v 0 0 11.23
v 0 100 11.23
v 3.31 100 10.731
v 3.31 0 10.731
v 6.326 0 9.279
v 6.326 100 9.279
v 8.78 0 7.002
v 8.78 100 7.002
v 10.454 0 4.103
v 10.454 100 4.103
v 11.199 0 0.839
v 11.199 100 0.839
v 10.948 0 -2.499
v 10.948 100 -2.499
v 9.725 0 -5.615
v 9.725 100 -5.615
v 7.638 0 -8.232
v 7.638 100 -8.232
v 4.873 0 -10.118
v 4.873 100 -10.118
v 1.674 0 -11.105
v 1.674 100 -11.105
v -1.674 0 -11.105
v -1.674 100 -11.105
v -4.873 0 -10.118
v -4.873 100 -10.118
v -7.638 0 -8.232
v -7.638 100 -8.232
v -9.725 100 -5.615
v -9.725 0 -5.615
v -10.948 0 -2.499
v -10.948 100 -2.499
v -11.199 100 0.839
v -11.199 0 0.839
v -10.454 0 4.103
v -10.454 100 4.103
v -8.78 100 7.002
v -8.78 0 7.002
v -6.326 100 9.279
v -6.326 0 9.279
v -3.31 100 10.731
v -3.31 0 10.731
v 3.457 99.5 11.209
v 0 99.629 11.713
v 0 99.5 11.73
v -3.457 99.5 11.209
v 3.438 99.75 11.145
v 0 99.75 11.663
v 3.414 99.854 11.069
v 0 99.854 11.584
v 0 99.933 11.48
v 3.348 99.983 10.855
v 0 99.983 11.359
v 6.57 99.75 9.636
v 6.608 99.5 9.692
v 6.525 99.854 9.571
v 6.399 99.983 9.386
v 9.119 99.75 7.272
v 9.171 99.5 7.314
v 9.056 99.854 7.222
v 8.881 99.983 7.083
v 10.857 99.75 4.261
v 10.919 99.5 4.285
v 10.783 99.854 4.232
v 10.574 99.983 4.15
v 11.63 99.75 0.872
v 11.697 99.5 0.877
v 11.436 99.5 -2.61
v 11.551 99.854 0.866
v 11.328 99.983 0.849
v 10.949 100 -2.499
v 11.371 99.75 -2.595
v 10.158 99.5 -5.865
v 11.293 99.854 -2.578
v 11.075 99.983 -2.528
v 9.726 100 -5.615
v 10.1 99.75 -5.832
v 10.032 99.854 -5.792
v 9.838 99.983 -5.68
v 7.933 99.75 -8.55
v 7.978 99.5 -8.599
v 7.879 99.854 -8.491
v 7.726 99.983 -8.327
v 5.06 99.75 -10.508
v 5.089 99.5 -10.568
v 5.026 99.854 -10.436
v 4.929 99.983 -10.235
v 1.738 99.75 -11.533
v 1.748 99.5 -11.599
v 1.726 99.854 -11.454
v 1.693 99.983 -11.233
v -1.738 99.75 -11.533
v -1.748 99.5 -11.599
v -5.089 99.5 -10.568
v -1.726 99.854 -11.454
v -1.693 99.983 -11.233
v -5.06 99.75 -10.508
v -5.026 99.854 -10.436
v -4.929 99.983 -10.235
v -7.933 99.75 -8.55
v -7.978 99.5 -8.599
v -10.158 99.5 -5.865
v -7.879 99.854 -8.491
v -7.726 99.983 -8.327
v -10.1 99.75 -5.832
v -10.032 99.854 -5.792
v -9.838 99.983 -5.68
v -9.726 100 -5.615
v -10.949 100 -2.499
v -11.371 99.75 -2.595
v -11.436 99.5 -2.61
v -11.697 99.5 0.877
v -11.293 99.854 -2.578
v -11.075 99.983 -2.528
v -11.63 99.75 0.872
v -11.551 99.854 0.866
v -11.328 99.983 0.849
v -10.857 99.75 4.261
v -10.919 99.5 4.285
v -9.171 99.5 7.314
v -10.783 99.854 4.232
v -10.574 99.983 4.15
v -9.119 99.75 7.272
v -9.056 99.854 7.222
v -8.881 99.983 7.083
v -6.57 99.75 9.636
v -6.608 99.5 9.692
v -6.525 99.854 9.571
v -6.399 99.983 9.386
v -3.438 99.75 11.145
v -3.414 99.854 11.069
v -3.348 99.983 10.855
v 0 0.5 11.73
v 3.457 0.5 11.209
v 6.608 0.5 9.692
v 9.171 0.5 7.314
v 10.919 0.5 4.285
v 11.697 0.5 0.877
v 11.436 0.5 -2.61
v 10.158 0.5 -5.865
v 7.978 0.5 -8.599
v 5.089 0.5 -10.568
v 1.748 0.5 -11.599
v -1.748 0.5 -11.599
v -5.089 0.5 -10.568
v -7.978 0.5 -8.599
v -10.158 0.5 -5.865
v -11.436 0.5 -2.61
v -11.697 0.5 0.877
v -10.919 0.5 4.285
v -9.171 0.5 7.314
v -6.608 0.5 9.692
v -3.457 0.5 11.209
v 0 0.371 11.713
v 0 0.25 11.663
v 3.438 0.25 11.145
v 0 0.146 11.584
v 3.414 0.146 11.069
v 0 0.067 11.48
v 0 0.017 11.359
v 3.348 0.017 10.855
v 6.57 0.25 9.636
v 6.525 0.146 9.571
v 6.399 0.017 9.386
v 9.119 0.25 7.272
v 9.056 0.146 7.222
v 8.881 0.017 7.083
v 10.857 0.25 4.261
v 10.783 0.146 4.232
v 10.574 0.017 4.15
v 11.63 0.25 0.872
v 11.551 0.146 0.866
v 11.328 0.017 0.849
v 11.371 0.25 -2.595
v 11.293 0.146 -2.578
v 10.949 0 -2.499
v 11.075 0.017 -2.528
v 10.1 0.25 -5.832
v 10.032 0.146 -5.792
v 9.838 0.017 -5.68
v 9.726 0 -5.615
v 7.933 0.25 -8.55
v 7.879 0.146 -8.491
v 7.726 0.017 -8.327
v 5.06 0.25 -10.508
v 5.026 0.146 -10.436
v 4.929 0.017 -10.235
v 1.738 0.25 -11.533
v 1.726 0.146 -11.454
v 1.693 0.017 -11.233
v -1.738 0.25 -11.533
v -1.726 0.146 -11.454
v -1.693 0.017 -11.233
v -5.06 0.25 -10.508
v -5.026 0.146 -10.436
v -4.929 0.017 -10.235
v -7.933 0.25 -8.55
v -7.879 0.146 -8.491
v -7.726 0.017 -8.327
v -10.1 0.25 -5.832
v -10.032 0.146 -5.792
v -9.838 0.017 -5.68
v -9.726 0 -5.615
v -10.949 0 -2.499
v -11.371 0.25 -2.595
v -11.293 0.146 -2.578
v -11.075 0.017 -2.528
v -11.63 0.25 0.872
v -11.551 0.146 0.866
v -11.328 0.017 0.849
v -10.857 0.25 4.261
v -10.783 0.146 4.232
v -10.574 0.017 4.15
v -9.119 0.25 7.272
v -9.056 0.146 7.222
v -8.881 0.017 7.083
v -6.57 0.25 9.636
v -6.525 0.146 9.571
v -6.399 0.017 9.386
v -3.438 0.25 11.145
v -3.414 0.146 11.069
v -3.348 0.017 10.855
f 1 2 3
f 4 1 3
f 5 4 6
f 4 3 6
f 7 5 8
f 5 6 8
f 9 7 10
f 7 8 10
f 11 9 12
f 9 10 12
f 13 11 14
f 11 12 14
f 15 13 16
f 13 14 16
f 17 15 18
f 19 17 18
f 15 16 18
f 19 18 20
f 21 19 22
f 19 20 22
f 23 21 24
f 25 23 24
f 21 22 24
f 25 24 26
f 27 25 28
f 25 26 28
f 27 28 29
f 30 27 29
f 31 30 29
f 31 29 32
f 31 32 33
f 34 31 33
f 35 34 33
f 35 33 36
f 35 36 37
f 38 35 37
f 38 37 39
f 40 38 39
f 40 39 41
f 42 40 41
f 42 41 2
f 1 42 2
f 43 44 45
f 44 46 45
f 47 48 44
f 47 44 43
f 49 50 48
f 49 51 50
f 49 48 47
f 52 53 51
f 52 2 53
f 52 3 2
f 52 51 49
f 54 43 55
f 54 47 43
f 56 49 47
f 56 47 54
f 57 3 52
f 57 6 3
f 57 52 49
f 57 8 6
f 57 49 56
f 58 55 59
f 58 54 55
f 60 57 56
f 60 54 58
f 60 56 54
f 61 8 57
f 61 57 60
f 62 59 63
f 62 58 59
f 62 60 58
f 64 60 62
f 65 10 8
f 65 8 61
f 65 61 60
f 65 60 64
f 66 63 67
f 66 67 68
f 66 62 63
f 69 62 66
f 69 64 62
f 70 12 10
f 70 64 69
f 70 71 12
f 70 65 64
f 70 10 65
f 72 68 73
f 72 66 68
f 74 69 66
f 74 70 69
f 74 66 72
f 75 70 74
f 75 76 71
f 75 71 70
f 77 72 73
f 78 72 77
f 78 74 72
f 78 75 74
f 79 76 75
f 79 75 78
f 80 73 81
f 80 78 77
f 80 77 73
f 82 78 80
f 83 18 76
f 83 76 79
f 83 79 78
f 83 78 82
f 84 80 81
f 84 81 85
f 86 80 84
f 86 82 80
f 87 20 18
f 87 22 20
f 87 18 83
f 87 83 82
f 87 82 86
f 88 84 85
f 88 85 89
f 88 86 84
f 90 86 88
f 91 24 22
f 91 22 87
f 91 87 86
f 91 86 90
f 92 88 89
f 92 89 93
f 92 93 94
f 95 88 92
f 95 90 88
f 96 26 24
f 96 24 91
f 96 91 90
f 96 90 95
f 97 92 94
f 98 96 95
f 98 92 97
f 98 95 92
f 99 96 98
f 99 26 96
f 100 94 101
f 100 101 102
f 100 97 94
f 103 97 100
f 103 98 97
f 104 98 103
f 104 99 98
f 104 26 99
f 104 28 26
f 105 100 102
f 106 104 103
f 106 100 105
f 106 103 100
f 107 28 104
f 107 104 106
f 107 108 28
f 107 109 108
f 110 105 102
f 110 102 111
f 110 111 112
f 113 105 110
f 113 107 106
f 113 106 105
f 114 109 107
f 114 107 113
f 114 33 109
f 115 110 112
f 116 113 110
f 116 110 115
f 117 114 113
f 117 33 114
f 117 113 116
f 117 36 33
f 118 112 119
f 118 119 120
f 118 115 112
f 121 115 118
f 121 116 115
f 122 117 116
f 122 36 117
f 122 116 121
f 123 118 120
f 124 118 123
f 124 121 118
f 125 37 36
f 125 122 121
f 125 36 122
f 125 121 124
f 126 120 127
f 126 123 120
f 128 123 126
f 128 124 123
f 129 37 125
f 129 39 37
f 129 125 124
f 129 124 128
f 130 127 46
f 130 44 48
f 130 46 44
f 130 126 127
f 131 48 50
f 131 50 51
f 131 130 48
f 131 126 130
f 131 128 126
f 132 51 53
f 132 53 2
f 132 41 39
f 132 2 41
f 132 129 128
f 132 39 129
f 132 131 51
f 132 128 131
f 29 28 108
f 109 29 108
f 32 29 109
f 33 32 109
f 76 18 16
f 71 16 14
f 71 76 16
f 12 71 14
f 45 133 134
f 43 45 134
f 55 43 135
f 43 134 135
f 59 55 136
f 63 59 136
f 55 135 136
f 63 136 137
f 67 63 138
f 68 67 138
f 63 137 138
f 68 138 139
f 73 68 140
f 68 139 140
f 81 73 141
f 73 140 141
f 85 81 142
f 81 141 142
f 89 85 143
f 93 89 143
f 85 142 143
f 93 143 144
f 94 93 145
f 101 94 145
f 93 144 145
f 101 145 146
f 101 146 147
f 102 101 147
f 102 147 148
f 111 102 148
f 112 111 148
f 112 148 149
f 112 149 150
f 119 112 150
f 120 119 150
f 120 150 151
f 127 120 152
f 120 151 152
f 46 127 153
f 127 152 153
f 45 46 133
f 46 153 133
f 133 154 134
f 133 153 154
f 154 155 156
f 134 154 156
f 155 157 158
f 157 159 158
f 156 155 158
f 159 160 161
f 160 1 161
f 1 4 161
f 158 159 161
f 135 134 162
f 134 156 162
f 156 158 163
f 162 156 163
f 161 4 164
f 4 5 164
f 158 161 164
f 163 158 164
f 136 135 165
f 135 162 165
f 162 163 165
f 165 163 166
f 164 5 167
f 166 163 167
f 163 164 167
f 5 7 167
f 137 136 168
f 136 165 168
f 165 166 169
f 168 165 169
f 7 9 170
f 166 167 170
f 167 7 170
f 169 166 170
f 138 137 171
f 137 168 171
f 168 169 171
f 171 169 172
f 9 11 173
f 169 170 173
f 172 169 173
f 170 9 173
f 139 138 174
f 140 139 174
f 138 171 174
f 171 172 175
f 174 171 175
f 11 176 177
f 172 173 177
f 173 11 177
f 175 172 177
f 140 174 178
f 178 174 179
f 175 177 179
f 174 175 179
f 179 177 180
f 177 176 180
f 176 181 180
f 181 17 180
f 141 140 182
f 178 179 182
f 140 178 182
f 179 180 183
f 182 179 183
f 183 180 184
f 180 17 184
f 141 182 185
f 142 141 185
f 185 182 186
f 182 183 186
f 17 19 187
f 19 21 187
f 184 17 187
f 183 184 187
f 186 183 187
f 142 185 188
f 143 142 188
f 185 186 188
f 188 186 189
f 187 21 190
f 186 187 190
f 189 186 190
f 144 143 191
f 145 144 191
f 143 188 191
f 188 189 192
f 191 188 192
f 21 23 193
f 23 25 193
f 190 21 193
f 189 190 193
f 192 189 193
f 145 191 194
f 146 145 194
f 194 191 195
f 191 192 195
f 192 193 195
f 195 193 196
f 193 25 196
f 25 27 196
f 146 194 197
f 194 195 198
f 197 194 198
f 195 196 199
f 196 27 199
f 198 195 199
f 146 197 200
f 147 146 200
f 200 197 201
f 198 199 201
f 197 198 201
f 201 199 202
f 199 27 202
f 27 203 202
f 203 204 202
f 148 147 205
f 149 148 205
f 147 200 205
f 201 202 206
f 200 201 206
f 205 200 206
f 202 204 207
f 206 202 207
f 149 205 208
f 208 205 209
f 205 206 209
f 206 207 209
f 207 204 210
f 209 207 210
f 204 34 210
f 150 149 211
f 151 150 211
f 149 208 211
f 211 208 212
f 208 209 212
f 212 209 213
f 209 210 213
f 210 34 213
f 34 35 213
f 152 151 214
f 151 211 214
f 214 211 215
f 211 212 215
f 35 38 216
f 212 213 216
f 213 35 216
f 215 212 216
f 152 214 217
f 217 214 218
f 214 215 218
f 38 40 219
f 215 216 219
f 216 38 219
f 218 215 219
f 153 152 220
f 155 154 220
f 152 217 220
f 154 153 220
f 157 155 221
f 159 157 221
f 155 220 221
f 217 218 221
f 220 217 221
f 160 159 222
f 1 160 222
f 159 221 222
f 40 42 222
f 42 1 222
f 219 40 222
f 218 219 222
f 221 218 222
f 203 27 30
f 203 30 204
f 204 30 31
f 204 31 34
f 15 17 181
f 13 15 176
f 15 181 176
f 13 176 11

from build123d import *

# Parameters (mm, degrees)
CROQUIS1_R              = 11.73
SALIENTE_EXTRUIR1_DEPTH = 100
CROQUIS2_R              = 11.23
CORTAR_EXTRUIR1_DEPTH   = 102.366591143
REDONDEO1_R             = 0.5
REDONDEO4_R             = 0.5


with BuildPart() as part:
    # Croquis1 → Saliente-Extruir1 (new body)
    with BuildSketch(Plane(origin=(0, 0, 0), x_dir=(1, 0, 0), z_dir=(0, 1, 0))):
        with Locations(Location((0, 0, 0), (0, 0, 270))):
            Circle(CROQUIS1_R)
    extrude(amount=SALIENTE_EXTRUIR1_DEPTH)

    # Croquis2 → Cortar-Extruir1 (cut, through all)
    with BuildSketch(Plane(origin=(0, 100, 0), x_dir=(1, 0, 0), z_dir=(0, 1, 0))):
        with Locations(Location((0, 0, 0), (0, 0, 270))):
            Circle(CROQUIS2_R)
    extrude(amount=-CORTAR_EXTRUIR1_DEPTH, mode=Mode.SUBTRACT)

    # Redondeo1
    redondeo1_edges = [part.edges().sort_by_distance(p)[0] for p in [
        (0, 100, -11.73),
    ]]
    fillet(redondeo1_edges, radius=REDONDEO1_R - 0.0001)  # a hair under: the kernel refuses the full size

    # Redondeo4
    redondeo4_edges = [part.edges().sort_by_distance(p)[0] for p in [
        (0, 0, -11.73),
    ]]
    fillet(redondeo4_edges, radius=REDONDEO4_R - 0.0001)  # a hair under: the kernel refuses the full size


solid = part.part
